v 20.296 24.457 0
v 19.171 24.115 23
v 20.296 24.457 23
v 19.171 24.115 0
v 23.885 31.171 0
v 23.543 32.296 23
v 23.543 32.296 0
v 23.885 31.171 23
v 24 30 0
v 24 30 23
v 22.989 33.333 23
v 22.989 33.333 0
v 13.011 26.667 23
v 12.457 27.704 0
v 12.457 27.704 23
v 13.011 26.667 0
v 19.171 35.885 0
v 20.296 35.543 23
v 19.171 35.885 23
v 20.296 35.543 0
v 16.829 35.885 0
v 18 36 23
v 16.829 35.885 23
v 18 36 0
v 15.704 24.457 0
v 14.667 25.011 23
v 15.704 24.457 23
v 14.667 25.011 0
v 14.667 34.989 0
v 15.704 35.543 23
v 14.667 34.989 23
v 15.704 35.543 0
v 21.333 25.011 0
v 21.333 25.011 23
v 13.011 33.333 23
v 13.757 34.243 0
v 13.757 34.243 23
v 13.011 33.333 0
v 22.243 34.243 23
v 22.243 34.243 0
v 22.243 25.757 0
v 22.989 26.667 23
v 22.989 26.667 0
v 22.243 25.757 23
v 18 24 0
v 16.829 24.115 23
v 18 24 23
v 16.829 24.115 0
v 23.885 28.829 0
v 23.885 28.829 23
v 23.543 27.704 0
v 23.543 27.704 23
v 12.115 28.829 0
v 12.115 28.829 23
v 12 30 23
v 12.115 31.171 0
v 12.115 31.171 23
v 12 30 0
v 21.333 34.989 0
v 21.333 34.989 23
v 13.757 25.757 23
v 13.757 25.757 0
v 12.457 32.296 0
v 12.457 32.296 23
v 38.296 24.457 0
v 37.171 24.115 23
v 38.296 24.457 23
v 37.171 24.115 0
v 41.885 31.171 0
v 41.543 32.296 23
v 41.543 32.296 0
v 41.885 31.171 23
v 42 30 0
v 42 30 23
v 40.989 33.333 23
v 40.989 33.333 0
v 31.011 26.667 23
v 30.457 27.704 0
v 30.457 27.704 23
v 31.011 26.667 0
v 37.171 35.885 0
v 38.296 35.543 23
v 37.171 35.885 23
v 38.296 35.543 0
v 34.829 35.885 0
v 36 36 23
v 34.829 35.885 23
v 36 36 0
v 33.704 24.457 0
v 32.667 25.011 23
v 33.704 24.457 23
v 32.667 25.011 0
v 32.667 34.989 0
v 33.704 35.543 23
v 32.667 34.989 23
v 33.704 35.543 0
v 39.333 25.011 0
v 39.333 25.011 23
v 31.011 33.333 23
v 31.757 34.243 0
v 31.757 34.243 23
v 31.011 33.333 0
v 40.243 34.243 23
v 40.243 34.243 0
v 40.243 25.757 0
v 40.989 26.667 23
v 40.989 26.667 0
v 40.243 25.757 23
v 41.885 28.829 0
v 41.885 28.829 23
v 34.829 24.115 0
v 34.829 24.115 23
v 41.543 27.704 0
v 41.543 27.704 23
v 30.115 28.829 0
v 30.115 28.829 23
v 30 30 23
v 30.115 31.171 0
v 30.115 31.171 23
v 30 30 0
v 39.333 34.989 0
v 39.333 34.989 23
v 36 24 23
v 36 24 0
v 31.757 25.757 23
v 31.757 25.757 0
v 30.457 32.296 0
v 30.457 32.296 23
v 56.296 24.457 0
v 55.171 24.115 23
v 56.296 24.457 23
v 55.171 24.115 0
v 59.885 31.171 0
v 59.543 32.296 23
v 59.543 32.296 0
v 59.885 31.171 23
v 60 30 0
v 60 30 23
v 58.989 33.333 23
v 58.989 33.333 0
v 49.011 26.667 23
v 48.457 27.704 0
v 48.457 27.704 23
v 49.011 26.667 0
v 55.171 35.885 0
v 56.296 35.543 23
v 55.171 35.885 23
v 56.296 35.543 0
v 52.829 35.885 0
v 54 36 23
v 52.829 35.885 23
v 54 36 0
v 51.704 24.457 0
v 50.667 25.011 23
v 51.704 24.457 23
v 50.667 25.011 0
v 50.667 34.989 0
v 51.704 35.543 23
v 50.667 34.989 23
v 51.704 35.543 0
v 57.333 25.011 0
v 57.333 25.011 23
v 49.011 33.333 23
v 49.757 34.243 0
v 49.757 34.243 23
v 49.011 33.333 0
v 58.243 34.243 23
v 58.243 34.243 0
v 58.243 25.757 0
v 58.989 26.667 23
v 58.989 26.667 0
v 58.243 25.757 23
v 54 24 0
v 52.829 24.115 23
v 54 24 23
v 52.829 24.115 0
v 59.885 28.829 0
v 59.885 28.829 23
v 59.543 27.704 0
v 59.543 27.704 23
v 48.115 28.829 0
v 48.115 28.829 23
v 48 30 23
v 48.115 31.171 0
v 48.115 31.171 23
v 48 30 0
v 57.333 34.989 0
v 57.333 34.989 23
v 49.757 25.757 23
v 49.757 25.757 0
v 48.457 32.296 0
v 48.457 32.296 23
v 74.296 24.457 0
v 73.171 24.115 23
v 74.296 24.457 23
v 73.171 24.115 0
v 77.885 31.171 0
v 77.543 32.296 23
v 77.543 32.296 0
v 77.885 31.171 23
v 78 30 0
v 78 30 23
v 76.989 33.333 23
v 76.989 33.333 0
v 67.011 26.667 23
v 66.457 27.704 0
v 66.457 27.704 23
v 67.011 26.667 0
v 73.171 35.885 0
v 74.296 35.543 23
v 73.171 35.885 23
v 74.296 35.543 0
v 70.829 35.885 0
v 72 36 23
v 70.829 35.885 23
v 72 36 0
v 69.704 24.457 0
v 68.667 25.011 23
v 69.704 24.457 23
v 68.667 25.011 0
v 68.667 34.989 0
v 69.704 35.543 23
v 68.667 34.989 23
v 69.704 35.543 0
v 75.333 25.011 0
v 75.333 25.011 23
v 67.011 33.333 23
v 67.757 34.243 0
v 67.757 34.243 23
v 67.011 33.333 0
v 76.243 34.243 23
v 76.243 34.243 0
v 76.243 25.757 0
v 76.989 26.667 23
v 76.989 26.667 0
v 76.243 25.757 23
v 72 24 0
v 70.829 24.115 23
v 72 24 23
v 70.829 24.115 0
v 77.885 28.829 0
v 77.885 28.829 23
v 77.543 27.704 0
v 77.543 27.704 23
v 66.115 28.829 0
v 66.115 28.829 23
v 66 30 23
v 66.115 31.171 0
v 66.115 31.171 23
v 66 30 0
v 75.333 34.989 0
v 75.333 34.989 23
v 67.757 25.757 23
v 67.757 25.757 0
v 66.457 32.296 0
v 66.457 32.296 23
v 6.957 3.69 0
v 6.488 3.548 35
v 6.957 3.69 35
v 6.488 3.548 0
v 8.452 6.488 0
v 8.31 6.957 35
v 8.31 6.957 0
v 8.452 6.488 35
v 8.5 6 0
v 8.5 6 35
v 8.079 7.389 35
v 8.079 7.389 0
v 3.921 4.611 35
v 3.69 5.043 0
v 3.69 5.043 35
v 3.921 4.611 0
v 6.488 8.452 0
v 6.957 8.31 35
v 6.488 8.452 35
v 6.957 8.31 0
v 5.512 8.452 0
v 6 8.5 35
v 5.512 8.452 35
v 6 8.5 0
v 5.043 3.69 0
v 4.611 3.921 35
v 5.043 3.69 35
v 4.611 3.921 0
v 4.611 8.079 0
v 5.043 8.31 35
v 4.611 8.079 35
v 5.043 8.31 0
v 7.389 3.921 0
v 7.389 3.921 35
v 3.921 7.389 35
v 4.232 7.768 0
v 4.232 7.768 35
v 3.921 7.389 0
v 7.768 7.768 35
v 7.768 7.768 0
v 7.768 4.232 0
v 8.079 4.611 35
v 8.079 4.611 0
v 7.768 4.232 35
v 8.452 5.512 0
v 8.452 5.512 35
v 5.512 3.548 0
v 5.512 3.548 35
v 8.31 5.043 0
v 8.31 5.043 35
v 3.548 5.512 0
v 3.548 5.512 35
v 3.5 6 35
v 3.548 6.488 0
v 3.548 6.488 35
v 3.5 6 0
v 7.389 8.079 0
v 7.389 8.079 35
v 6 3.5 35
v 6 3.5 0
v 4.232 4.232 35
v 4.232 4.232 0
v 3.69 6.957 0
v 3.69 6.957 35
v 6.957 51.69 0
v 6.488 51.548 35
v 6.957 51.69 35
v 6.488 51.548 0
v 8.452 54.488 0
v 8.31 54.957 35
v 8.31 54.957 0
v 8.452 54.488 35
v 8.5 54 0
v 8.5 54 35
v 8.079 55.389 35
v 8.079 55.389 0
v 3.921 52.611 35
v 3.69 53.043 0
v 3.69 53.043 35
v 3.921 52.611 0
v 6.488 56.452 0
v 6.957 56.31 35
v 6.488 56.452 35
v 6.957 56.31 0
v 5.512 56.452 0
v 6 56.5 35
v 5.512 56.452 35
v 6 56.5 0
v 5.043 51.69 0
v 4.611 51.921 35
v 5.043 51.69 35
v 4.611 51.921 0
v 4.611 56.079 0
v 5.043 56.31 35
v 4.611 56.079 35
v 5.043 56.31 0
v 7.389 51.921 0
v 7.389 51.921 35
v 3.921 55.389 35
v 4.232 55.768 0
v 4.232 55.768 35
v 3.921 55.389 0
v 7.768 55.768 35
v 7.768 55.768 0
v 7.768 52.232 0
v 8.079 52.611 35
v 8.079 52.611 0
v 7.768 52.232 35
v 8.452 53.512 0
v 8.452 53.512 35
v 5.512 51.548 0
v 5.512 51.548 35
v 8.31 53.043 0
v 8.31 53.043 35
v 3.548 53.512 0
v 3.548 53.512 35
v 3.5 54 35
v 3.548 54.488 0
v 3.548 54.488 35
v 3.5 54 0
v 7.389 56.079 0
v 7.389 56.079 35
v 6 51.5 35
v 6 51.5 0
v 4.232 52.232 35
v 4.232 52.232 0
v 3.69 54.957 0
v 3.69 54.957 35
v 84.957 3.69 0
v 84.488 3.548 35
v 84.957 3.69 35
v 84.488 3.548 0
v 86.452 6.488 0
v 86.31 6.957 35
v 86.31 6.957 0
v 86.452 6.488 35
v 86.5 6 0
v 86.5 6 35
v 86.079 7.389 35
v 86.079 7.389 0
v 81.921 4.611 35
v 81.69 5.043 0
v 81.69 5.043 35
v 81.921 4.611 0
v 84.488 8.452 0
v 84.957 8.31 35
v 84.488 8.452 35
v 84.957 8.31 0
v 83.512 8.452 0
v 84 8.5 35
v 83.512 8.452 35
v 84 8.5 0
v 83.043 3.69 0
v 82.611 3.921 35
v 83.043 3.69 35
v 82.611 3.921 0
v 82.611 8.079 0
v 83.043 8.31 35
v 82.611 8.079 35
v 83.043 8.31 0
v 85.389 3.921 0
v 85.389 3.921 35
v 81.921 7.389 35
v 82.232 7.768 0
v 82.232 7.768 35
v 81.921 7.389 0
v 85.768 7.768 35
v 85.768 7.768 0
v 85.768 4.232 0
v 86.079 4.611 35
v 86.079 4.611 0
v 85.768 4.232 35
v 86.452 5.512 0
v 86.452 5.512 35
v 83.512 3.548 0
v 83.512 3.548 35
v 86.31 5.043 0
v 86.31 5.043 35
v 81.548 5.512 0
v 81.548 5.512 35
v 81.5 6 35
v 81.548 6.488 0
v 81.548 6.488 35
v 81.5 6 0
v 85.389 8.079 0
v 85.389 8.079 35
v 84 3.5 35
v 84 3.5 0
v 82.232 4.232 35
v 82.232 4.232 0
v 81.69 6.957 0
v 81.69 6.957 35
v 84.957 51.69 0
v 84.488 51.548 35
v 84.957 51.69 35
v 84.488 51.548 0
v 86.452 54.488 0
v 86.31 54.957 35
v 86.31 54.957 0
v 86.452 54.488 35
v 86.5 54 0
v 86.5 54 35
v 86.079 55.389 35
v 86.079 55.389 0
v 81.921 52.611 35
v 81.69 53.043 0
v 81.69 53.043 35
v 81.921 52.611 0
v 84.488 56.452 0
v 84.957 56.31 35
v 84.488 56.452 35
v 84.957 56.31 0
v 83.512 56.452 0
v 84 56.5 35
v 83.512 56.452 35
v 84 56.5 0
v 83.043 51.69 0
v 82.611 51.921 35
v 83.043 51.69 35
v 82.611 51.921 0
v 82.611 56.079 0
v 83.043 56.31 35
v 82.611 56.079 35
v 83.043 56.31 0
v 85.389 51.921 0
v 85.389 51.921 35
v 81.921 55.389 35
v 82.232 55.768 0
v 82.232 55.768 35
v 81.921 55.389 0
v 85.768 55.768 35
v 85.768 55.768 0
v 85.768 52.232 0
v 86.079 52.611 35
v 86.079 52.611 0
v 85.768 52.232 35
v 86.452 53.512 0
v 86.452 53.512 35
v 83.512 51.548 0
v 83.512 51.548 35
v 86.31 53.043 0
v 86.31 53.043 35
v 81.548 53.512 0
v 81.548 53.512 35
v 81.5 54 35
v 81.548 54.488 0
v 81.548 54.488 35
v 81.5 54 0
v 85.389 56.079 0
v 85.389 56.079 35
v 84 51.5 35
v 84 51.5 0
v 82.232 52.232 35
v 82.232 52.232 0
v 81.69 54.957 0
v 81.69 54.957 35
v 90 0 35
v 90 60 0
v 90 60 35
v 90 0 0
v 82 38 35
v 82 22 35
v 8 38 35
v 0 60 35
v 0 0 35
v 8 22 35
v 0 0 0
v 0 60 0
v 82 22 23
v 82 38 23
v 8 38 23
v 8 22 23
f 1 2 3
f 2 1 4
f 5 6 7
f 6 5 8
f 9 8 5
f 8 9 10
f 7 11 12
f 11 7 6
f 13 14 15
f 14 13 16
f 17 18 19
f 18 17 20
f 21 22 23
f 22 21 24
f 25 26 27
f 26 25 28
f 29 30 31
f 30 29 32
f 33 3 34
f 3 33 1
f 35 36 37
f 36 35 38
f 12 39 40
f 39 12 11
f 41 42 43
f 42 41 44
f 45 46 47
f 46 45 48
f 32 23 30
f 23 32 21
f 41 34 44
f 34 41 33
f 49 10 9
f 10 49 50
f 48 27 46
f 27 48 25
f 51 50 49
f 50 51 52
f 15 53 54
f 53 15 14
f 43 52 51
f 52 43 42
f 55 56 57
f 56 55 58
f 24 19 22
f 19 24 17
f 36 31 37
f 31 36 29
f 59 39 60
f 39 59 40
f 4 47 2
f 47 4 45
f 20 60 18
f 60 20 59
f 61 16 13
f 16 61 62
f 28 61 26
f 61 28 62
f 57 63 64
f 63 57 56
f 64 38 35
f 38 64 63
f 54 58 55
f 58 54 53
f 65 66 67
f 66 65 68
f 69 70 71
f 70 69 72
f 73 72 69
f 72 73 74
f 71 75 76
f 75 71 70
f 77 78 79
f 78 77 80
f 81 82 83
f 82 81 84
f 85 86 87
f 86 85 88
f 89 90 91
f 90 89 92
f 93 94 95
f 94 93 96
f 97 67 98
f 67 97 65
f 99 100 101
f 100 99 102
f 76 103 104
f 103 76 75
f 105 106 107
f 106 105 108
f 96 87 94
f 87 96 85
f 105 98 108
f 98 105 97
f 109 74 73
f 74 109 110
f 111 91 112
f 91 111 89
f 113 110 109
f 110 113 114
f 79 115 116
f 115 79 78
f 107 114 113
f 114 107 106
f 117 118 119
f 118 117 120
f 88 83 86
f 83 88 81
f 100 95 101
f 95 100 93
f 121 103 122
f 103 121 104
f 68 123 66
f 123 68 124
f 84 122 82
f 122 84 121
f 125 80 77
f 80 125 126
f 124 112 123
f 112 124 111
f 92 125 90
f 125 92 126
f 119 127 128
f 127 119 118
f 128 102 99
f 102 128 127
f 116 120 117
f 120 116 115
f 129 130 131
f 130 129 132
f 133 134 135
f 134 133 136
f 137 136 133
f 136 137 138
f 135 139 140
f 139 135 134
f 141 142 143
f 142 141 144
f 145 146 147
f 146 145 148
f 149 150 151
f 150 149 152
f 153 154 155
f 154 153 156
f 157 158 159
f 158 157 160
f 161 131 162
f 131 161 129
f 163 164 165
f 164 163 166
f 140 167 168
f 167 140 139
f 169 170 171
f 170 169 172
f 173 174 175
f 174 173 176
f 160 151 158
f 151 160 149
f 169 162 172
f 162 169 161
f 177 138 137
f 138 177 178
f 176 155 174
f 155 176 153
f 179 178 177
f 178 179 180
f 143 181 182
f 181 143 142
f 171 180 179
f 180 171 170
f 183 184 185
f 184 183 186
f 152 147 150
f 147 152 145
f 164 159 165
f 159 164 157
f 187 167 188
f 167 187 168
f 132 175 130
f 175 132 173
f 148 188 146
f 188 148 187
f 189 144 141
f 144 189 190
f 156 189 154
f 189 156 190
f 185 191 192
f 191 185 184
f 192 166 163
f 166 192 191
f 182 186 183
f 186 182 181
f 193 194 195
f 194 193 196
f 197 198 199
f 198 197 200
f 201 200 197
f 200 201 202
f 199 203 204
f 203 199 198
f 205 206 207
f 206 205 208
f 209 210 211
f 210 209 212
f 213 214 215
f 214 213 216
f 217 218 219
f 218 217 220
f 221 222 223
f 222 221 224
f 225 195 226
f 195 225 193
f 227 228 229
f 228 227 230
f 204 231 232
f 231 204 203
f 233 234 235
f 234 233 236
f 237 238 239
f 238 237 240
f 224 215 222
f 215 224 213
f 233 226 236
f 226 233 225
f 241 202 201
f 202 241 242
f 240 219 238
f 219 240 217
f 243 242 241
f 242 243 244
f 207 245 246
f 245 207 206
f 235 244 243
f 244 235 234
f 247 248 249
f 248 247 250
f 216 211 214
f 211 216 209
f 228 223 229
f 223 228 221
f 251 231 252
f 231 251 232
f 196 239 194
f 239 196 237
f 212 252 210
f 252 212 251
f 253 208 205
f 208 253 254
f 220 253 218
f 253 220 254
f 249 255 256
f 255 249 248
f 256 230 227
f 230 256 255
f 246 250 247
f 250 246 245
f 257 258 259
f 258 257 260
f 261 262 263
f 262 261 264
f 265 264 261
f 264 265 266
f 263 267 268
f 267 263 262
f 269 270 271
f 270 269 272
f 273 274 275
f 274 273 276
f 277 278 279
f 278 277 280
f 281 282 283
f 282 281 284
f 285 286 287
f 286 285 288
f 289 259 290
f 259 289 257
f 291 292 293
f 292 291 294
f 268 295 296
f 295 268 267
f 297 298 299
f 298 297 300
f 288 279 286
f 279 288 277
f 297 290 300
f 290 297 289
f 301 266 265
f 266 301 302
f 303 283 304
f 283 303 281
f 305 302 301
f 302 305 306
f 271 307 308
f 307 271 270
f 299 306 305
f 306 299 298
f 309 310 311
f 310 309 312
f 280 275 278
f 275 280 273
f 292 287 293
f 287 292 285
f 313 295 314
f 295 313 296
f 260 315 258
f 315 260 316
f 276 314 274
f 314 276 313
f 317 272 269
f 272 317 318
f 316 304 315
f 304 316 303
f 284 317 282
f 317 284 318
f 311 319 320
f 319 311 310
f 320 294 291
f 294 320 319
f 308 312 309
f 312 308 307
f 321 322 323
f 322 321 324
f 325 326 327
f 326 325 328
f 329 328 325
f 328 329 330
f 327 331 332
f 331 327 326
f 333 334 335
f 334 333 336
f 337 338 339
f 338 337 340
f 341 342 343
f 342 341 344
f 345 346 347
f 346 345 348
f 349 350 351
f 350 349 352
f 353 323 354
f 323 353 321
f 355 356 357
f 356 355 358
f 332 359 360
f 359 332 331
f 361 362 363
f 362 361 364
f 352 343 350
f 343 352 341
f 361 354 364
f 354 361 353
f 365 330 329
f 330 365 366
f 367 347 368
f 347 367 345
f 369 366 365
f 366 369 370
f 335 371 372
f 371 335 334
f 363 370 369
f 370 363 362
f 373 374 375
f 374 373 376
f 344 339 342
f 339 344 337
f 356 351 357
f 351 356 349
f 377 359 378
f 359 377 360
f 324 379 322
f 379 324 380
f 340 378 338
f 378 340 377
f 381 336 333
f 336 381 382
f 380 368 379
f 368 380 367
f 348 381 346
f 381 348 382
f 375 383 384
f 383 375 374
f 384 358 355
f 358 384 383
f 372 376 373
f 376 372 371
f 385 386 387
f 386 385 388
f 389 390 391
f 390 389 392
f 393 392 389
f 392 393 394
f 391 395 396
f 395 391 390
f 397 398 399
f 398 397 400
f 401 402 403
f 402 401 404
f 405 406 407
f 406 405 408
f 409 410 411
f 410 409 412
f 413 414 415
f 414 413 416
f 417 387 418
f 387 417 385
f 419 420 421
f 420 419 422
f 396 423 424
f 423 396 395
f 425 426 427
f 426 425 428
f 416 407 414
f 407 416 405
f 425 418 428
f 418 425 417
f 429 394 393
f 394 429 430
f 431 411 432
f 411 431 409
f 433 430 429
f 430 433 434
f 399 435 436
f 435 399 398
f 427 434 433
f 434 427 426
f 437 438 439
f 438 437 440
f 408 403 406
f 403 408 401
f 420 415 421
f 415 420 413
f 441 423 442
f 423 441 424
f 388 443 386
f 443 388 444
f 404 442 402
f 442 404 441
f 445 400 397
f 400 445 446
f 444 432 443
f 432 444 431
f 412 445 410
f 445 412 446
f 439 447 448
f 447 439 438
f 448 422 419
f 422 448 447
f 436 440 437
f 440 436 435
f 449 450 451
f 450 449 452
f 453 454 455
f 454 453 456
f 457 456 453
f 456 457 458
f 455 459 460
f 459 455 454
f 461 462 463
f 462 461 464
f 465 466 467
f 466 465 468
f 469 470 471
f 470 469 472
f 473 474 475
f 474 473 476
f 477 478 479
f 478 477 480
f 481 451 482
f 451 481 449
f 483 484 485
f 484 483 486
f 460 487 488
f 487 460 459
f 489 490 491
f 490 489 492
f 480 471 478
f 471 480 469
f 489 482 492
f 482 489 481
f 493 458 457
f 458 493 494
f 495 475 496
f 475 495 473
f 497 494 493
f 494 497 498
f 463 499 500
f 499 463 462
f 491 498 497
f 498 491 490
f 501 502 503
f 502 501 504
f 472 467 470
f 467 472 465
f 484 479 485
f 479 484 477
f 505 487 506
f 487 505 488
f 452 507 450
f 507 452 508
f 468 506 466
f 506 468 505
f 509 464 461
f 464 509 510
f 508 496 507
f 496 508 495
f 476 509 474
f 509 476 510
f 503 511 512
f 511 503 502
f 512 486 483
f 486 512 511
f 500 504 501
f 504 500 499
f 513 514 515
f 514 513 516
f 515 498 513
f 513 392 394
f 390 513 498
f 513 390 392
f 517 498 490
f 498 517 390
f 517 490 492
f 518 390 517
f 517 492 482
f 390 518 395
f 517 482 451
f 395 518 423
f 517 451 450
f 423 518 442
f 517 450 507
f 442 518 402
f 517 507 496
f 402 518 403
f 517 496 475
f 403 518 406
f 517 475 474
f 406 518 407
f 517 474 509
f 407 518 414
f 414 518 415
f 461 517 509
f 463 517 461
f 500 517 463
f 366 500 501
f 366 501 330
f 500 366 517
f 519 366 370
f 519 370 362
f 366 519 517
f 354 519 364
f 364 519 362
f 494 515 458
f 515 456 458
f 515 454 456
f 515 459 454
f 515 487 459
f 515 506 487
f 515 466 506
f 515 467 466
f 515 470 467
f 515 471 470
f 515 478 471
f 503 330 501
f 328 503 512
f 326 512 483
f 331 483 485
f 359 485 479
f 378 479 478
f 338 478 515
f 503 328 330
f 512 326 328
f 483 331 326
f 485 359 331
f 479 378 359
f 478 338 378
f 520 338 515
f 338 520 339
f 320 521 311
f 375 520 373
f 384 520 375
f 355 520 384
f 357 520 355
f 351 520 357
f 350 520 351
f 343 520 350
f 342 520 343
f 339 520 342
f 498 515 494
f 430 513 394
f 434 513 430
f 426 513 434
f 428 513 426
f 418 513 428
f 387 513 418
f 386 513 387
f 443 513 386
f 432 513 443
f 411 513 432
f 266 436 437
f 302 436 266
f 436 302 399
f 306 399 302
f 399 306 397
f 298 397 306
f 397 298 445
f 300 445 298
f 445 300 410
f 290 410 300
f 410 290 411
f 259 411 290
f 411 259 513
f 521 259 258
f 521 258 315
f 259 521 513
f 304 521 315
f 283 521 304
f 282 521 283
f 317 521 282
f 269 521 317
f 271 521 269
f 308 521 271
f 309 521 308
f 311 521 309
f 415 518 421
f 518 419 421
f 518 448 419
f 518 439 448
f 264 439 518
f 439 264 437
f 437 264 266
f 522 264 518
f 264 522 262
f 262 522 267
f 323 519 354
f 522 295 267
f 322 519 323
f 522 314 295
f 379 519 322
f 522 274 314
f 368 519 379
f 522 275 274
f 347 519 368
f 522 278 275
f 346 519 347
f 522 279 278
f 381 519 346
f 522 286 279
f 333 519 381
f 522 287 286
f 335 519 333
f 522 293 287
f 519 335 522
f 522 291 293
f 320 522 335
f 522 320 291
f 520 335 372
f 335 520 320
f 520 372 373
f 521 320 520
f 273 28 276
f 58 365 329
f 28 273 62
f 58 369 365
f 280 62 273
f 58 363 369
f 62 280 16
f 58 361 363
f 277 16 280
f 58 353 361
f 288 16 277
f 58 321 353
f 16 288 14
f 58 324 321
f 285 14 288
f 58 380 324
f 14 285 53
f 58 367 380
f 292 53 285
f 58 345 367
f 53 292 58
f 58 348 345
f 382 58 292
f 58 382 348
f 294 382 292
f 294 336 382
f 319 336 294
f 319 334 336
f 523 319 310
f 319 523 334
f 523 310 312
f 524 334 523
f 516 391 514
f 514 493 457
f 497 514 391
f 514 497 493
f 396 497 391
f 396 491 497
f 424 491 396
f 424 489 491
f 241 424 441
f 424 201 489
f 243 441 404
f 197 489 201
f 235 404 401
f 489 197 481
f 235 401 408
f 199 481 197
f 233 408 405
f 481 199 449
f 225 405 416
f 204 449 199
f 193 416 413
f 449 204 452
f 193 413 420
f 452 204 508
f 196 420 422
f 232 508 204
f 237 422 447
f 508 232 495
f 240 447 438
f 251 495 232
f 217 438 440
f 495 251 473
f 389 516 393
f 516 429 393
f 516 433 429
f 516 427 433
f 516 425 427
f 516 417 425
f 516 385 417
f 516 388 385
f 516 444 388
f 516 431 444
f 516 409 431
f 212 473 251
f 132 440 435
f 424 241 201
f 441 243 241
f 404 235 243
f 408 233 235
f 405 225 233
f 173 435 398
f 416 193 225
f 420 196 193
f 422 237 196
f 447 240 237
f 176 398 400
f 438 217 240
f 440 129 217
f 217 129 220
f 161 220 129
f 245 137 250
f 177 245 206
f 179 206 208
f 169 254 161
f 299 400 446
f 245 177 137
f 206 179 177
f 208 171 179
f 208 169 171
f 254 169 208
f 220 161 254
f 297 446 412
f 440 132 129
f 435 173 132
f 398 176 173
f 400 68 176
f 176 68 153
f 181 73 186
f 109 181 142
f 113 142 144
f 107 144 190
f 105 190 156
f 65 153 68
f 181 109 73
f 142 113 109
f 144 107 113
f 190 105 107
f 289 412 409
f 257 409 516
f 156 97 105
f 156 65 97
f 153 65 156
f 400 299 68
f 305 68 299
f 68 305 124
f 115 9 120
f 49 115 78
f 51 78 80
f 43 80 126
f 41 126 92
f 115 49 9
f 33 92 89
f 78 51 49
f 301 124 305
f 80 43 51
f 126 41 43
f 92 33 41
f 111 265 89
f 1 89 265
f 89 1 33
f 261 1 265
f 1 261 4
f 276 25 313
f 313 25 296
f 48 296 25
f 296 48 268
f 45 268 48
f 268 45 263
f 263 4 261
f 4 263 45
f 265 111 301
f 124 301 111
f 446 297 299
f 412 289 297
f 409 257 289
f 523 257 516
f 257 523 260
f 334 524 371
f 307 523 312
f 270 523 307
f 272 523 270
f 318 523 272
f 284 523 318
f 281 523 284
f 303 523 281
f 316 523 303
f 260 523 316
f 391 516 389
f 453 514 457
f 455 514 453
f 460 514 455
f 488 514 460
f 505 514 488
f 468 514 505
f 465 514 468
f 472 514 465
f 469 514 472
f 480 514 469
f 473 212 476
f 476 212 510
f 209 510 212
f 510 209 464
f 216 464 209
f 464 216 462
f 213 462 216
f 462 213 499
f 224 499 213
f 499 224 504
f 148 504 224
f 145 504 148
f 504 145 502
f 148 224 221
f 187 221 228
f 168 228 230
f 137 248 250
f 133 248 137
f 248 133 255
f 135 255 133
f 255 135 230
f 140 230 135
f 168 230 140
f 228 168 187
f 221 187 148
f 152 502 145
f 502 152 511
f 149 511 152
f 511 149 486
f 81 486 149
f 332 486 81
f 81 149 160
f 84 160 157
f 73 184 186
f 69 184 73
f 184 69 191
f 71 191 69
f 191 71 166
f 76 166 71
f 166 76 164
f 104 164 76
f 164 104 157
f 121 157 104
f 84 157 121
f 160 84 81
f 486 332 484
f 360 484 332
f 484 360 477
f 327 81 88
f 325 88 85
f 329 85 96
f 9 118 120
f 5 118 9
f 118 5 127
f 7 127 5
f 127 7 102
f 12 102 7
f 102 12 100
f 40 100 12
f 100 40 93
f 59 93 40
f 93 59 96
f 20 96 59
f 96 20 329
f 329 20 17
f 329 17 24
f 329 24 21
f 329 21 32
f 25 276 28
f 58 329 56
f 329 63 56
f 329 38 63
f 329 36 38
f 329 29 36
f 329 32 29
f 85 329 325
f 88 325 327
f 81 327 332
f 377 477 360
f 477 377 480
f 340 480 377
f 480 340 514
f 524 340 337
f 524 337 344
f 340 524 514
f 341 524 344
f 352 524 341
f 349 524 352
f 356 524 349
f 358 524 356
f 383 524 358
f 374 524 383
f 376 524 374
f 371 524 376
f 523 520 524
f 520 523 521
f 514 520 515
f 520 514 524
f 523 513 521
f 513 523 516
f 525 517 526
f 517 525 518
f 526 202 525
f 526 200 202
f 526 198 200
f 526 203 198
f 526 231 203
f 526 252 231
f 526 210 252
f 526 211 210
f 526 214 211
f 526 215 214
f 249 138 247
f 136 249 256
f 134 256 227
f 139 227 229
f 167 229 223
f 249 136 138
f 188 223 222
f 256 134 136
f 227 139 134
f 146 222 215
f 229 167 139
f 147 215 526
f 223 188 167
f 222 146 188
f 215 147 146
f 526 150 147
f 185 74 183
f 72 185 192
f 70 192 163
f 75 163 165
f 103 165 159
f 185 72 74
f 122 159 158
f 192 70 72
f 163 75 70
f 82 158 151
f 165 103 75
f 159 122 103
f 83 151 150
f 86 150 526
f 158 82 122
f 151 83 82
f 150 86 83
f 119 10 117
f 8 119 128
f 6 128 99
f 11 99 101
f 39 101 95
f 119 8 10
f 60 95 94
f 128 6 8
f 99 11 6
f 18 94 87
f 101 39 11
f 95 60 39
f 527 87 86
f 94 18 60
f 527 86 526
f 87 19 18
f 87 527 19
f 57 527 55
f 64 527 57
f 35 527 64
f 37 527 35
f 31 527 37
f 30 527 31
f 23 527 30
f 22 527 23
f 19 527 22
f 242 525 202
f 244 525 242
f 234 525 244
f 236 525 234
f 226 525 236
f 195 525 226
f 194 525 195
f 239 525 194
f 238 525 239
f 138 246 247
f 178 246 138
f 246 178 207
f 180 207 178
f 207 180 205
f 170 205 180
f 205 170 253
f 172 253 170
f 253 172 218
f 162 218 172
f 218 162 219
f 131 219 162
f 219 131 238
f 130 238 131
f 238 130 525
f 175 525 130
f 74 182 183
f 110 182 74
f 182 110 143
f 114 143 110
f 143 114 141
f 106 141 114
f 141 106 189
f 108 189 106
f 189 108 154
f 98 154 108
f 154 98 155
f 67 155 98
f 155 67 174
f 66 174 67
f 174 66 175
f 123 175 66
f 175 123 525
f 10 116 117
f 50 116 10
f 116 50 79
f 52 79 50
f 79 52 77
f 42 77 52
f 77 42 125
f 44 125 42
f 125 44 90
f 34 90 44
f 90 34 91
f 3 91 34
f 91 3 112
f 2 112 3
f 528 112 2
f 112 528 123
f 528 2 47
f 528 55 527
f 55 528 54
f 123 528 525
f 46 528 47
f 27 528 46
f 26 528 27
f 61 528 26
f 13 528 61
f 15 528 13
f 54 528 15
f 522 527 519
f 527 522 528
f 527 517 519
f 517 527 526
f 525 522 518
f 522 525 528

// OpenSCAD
$fn = 32;

// ----------------------------------------------------------------------
// Manifold block: gallery_top manifold
// ----------------------------------------------------------------------

// --- parameters (mm) ---
block_l = 90;             // block length, X
block_w = 60;             // block width, Y
block_h = 35;             // block height, Z
port_d = 12;              // port bore diameter
port_pitch = 18;          // port pitch along X
gallery_d = 16;           // top gallery width, Y
gallery_depth = 12;       // gallery pocket depth
wall_p = 8;               // gallery end wall thickness, X
mnt_d = 5;                // mounting hole diameter
mnt_in = 6;               // mounting hole inset from the edges

n_ports = 4;  // ports in the row
port_x0 = (block_l - (n_ports - 1) * port_pitch) / 2;  // first port X

difference() {
  cube([block_l, block_w, block_h]);
  for (i = [0 : n_ports - 1])
    translate([port_x0 + i * port_pitch, block_w / 2, -1])
      cylinder(h = block_h + 2, d = port_d);
  translate([wall_p, block_w / 2 - gallery_d / 2, block_h - gallery_depth])
    cube([block_l - 2 * wall_p, gallery_d, gallery_depth + 1]);
  for (cx = [mnt_in, block_l - mnt_in])
    for (cy = [mnt_in, block_w - mnt_in])
      translate([cx, cy, -1]) cylinder(h = block_h + 2, d = mnt_d);
}
